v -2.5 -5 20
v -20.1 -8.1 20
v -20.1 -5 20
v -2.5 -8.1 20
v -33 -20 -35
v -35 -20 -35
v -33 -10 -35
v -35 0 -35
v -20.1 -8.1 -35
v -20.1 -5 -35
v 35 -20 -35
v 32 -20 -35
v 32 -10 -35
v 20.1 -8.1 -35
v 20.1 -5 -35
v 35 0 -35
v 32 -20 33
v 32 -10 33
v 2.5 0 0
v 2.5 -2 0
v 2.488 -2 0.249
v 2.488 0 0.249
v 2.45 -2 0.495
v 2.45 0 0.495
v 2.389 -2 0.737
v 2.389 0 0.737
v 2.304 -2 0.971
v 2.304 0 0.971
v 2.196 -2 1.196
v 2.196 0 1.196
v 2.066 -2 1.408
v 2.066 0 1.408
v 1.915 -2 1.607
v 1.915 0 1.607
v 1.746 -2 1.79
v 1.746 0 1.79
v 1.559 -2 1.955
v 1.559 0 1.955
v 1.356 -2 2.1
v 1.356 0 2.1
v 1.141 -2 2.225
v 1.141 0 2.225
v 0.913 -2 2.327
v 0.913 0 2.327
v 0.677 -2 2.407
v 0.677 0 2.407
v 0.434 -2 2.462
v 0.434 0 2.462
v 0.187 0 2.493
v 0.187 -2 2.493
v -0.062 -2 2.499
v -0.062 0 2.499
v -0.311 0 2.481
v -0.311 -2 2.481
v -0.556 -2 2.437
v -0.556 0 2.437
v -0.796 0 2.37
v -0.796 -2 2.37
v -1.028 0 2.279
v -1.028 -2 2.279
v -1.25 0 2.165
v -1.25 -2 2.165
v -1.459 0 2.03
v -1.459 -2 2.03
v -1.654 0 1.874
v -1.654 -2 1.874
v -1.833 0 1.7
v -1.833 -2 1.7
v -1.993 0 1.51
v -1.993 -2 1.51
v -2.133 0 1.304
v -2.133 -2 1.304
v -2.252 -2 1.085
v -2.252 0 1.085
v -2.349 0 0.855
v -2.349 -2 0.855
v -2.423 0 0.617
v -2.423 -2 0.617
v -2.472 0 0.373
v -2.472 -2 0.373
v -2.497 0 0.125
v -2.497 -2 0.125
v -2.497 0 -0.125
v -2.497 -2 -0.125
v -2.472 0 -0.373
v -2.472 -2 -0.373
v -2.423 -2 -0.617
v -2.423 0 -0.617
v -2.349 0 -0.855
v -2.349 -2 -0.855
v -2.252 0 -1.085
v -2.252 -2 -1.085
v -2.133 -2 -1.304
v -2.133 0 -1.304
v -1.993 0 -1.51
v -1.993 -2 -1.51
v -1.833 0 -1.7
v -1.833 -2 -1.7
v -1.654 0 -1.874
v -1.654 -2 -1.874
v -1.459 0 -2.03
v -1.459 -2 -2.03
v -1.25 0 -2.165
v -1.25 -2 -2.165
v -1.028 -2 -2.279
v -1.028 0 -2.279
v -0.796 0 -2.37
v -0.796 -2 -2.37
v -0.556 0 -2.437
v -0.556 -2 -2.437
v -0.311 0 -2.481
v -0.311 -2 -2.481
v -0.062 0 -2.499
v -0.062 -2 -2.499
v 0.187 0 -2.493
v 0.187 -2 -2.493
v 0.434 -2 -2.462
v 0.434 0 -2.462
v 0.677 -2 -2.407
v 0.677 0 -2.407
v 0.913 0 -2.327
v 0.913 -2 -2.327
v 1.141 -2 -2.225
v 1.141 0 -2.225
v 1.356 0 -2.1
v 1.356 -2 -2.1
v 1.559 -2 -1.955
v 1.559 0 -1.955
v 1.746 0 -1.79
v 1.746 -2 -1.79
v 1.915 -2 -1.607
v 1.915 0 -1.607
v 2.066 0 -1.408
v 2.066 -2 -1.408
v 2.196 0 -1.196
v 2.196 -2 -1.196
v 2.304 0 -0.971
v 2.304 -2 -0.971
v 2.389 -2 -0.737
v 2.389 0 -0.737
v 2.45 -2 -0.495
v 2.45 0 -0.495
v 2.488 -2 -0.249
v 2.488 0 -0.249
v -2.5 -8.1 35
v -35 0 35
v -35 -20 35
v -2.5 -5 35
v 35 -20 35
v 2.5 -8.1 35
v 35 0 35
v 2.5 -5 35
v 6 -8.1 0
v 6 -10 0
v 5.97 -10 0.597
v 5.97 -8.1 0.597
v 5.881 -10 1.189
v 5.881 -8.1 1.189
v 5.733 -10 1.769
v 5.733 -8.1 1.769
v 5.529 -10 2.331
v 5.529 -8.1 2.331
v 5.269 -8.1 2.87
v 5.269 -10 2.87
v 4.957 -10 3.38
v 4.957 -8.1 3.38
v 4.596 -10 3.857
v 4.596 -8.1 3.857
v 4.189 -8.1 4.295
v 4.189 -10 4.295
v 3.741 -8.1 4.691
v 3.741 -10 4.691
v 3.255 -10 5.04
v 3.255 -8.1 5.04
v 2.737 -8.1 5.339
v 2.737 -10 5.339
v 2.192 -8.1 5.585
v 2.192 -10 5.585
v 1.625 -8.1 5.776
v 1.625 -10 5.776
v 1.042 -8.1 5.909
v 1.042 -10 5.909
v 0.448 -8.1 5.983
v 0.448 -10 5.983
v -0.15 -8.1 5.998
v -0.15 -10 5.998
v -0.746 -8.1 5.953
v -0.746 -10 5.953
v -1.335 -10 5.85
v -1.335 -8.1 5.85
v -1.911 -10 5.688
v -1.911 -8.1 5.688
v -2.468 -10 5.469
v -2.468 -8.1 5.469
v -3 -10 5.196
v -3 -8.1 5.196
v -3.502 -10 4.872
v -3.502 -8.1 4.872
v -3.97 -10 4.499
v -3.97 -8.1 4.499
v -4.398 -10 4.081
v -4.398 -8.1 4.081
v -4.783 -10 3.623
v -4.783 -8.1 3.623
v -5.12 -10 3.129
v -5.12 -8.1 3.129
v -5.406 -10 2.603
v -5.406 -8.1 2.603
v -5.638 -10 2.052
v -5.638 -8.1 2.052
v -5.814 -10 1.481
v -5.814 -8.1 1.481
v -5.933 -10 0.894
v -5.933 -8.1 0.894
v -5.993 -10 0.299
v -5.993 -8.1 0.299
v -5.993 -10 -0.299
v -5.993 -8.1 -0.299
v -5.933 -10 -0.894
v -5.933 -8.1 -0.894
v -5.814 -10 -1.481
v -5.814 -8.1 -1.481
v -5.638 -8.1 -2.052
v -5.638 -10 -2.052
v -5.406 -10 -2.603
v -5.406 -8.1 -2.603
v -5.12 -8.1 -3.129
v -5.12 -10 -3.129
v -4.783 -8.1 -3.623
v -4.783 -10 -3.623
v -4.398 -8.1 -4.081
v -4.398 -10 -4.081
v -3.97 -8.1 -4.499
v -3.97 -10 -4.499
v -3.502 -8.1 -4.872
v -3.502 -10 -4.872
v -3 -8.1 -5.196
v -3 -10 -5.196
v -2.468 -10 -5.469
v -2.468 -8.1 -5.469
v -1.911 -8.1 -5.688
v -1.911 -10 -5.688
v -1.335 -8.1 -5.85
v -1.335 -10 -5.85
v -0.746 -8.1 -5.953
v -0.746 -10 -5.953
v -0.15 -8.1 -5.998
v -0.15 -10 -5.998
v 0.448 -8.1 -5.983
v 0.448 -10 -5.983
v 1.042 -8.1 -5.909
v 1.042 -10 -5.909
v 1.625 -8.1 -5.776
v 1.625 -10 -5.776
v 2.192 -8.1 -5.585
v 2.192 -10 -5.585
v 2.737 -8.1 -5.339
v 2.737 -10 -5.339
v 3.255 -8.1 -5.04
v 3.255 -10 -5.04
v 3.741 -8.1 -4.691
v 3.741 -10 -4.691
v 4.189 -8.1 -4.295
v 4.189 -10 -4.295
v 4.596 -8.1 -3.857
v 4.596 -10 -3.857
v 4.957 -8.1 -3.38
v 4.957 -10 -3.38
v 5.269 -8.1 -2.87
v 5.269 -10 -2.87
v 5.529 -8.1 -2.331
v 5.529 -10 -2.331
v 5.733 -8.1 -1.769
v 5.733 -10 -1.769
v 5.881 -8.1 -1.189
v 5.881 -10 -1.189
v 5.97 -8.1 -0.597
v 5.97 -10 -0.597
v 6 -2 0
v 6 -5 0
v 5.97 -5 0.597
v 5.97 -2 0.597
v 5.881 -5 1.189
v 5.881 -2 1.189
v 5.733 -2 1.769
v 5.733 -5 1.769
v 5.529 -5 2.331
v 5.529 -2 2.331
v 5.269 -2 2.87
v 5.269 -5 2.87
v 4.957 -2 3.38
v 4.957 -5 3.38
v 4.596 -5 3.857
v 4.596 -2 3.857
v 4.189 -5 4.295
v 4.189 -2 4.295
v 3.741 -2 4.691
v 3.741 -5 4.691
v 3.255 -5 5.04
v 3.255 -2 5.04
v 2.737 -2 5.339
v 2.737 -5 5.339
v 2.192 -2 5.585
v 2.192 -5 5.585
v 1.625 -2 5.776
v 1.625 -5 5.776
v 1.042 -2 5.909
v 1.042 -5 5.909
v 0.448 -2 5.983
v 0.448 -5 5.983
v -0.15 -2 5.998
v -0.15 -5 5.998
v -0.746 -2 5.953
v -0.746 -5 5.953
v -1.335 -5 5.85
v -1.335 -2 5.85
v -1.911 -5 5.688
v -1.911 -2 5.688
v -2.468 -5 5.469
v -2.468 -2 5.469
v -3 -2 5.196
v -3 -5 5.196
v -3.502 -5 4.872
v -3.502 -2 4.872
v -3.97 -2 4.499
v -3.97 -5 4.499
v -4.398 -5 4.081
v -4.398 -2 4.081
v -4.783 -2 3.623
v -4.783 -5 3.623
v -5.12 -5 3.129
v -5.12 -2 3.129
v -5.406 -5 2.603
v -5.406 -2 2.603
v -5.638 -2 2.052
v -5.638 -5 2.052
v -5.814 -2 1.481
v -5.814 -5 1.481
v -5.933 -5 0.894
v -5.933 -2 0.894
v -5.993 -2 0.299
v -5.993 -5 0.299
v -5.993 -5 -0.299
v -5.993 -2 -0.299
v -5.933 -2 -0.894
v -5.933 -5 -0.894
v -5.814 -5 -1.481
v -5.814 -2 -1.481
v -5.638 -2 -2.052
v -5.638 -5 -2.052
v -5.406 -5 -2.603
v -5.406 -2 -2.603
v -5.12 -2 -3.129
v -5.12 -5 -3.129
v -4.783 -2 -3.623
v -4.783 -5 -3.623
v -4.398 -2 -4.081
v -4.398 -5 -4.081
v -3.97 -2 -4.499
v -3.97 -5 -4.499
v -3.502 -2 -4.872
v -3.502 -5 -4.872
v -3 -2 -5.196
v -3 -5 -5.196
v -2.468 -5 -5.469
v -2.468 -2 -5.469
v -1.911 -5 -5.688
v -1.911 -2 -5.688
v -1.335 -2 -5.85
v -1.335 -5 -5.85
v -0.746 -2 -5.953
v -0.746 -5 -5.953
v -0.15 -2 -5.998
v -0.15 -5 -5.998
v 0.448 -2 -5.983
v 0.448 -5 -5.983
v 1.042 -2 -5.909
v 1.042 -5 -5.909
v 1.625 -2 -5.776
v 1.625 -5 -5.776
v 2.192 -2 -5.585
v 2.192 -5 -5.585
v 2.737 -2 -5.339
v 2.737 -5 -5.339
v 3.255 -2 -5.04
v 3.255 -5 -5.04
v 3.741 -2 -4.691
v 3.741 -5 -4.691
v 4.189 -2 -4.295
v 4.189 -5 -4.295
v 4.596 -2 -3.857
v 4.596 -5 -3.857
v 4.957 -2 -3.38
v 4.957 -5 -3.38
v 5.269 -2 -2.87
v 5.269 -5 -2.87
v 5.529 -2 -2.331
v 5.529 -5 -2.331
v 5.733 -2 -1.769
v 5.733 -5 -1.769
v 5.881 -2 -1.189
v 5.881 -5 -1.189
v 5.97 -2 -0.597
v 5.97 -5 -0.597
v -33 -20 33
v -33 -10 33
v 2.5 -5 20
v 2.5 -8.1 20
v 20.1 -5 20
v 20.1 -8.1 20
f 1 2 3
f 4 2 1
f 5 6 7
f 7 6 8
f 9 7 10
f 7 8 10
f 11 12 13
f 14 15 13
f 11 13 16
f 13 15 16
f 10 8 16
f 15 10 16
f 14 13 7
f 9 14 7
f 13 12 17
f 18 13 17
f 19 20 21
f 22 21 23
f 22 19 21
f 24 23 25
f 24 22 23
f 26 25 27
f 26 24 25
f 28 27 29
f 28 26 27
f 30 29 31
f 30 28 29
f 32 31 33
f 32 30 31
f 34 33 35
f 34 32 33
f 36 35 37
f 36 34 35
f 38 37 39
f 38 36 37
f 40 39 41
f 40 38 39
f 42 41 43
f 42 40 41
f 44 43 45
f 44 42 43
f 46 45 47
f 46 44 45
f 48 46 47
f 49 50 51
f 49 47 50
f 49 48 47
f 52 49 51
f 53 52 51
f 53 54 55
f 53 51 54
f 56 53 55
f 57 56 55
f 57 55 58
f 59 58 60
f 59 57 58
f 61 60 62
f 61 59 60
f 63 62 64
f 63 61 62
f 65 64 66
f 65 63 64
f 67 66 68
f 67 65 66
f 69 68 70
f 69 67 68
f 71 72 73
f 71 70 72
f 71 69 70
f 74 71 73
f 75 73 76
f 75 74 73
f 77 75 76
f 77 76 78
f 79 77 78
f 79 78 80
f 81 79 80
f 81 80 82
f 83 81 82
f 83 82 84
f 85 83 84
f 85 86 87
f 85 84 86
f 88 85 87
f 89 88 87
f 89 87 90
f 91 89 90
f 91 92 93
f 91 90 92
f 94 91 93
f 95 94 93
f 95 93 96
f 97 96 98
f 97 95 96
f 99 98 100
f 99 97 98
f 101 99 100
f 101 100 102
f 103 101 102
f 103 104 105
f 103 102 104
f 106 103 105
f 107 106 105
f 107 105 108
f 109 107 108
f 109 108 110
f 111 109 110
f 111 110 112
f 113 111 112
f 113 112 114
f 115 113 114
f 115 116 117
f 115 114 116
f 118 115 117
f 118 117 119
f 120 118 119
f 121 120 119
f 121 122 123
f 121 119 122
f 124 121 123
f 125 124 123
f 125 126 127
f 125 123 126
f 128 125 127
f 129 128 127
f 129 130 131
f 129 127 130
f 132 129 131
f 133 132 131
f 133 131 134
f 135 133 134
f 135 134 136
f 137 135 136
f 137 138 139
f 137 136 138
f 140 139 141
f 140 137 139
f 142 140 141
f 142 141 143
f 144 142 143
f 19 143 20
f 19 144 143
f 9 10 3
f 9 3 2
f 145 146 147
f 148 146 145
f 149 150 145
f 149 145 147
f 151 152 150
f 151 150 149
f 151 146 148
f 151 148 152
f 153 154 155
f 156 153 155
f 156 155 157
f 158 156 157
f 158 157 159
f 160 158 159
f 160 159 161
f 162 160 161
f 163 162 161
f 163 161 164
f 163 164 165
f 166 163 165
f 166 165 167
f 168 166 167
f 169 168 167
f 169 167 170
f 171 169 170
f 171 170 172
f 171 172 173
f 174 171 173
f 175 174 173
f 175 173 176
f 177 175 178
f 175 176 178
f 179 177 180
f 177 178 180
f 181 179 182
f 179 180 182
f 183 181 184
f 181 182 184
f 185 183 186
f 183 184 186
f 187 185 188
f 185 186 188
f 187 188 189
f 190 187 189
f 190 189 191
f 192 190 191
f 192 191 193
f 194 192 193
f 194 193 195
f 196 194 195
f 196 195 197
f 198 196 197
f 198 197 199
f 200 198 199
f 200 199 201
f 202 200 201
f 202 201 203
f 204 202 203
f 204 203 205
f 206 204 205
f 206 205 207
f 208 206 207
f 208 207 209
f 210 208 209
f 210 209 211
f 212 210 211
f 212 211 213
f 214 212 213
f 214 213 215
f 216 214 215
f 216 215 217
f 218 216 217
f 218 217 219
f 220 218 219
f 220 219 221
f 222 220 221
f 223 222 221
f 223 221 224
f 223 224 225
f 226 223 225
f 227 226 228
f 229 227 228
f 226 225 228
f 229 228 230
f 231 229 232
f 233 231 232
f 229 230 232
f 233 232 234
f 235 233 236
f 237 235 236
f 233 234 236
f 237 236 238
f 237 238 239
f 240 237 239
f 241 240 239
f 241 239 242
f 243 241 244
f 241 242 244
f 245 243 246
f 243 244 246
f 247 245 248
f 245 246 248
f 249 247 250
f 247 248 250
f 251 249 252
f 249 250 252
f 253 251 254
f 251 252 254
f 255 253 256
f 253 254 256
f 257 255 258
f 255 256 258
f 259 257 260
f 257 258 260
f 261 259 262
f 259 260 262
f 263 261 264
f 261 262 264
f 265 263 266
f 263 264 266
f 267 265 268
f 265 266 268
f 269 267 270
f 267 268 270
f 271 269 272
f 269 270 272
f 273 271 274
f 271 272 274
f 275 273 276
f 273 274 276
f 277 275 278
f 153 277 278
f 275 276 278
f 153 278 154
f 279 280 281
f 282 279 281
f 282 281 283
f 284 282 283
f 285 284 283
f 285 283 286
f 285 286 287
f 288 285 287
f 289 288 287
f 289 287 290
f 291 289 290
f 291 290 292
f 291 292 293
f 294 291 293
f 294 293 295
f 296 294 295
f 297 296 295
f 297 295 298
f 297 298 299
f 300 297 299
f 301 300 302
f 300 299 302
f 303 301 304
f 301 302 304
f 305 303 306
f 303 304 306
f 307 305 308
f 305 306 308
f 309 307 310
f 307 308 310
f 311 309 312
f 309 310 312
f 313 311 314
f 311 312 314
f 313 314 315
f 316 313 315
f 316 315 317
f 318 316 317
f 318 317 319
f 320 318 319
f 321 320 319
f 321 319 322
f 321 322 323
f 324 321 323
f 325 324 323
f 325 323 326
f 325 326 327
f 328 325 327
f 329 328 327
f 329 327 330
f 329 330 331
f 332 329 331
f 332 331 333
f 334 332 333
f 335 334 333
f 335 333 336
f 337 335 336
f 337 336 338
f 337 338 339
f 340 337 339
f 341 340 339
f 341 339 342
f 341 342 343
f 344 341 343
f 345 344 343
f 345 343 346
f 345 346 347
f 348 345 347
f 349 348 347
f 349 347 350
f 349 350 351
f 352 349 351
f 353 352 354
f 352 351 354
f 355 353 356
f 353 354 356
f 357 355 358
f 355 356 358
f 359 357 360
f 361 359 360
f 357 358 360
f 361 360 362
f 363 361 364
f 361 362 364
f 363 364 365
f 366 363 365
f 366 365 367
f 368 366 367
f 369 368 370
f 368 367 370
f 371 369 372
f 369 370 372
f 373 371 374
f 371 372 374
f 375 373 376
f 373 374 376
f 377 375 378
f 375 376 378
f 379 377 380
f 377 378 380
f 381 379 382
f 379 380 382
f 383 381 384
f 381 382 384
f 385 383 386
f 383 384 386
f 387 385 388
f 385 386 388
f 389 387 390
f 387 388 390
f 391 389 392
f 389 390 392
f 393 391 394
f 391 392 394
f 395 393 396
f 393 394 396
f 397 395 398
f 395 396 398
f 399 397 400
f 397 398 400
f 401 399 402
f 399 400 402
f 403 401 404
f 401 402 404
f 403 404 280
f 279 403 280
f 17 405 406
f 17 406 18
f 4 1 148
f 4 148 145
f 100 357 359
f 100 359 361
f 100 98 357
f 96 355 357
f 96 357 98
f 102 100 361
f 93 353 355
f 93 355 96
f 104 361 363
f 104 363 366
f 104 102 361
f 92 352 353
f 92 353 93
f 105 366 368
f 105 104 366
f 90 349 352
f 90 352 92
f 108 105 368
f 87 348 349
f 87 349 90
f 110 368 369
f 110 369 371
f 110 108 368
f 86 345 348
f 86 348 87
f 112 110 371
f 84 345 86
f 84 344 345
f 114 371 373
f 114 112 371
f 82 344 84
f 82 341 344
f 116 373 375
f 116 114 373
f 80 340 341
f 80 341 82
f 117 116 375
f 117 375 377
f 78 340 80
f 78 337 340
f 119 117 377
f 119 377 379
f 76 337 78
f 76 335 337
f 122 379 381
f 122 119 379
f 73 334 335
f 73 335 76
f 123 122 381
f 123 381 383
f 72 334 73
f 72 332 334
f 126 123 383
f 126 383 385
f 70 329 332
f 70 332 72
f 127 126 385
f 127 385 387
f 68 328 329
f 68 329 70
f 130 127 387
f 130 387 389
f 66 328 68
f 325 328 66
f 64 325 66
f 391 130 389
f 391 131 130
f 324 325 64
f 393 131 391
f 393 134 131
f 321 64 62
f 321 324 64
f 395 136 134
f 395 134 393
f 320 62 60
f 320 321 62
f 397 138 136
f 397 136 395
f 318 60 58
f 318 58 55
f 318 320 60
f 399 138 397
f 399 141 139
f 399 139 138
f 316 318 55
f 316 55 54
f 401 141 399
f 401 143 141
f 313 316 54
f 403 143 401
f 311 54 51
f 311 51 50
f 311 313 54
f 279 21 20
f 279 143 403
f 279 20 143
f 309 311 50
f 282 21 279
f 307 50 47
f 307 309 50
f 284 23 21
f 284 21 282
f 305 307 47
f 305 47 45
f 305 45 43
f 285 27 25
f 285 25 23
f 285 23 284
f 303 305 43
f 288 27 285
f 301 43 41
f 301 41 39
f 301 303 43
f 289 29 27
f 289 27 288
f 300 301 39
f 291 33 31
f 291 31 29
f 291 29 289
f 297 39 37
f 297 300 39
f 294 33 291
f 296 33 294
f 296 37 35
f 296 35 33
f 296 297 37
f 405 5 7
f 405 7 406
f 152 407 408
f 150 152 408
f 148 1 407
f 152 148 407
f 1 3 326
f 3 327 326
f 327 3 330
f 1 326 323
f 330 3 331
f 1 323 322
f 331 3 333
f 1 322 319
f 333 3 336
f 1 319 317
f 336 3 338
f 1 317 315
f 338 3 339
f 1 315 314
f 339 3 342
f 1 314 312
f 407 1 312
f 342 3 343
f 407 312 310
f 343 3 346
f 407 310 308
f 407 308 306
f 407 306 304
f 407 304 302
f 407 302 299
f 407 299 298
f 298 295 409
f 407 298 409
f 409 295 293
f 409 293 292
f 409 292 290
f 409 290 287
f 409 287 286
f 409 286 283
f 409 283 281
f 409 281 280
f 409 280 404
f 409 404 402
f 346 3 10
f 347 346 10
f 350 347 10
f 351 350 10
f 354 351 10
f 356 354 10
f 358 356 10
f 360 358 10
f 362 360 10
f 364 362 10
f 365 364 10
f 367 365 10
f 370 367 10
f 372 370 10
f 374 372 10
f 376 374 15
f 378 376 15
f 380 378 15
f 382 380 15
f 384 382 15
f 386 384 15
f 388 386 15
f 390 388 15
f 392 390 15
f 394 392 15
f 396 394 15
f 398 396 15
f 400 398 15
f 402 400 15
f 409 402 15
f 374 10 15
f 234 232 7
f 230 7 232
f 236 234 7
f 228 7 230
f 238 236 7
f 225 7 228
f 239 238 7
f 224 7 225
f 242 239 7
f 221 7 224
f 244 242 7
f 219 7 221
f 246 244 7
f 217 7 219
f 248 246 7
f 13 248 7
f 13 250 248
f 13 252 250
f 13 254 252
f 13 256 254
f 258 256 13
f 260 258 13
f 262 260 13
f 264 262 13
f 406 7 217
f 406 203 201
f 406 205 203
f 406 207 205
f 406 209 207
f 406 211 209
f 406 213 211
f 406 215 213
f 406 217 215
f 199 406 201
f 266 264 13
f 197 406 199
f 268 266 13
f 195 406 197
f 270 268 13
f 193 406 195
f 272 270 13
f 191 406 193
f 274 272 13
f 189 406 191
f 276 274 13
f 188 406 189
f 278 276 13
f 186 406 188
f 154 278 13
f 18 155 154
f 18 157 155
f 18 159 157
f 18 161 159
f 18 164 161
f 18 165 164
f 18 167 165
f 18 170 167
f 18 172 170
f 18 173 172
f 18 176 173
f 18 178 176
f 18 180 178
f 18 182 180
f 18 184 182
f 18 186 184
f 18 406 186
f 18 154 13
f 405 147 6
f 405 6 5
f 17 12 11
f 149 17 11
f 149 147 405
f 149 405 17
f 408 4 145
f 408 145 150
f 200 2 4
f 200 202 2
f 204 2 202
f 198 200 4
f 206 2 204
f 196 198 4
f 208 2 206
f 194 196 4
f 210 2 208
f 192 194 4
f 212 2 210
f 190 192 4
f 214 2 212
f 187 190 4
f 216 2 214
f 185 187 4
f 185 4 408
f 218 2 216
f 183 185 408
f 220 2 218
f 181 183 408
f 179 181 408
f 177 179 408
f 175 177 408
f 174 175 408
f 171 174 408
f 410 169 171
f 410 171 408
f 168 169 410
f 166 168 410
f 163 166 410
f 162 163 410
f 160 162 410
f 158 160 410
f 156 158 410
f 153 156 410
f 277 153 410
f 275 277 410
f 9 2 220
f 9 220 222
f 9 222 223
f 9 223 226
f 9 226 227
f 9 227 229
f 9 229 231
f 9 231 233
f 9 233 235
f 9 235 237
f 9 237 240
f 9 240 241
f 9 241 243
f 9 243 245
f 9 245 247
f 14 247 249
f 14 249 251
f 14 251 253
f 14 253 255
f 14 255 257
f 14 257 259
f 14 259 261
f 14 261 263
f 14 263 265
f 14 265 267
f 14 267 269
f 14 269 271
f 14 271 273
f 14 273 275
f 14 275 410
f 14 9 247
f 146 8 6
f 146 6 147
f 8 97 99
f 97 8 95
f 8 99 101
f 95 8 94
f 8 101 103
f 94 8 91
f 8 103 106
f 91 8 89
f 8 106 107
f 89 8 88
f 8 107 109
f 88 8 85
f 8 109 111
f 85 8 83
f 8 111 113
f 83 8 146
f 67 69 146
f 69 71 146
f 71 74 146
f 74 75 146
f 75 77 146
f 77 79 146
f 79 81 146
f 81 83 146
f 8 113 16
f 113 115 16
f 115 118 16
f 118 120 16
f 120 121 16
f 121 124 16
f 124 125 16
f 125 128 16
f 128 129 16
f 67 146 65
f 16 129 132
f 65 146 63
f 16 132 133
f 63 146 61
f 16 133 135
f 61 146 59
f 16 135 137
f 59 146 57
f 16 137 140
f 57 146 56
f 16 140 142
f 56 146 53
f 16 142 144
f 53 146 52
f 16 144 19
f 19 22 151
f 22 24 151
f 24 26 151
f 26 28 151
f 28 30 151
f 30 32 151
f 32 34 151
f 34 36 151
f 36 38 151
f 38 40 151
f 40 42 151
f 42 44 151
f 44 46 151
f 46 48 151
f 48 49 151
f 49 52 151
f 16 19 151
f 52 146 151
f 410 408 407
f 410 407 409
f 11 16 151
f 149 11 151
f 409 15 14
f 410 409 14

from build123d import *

# Parameters (mm, degrees)
F0_W     = 70
F0_H     = 70
F0_R     = 2.5
F1_DEPTH = 20
F2_W     = 40.2
F2_H     = 3.1
F3_DEPTH = 55
F4_R     = 6
F5_DEPTH = 18
F6_W     = 65
F6_H     = 68
F7_DEPTH = 10
F8_W     = 5
F8_H     = 3.1
F9_DEPTH = 15.001


with BuildPart() as f1:
    # F0 (on Front) → F1 (new body)
    with BuildSketch(Plane.XZ):
        Rectangle(F0_W, F0_H)
        Circle(F0_R, mode=Mode.SUBTRACT)
    extrude(amount=F1_DEPTH)

    # F2 (on face) → F3 (cut)
    with BuildSketch(Plane(origin=(0, 0, -35), x_dir=(1, 0, 0), z_dir=(0, 0, -1))):
        with Locations((0, 6.55)):
            Rectangle(F2_W, F2_H)
    extrude(amount=-F3_DEPTH, mode=Mode.SUBTRACT)

    # F4 (on face) → F5 (cut)
    with BuildSketch(Plane.XZ.offset(20)):
        Circle(F4_R)
    extrude(amount=-F5_DEPTH, mode=Mode.SUBTRACT)

    # F6 (on face) → F7 (cut)
    with BuildSketch(Plane.XZ.offset(20)):
        with Locations((-0.5, -1)):
            Rectangle(F6_W, F6_H)
    extrude(amount=-F7_DEPTH, mode=Mode.SUBTRACT)

    # F8 (on face) → F9 (cut, through all)
    with BuildSketch(Plane(origin=(0, 0, 20), x_dir=(1, 0, 0), z_dir=(0, 0, -1))):
        with Locations((0, 6.55)):
            Rectangle(F8_W, F8_H)
    extrude(amount=-F9_DEPTH, mode=Mode.SUBTRACT)


solid = f1.part
